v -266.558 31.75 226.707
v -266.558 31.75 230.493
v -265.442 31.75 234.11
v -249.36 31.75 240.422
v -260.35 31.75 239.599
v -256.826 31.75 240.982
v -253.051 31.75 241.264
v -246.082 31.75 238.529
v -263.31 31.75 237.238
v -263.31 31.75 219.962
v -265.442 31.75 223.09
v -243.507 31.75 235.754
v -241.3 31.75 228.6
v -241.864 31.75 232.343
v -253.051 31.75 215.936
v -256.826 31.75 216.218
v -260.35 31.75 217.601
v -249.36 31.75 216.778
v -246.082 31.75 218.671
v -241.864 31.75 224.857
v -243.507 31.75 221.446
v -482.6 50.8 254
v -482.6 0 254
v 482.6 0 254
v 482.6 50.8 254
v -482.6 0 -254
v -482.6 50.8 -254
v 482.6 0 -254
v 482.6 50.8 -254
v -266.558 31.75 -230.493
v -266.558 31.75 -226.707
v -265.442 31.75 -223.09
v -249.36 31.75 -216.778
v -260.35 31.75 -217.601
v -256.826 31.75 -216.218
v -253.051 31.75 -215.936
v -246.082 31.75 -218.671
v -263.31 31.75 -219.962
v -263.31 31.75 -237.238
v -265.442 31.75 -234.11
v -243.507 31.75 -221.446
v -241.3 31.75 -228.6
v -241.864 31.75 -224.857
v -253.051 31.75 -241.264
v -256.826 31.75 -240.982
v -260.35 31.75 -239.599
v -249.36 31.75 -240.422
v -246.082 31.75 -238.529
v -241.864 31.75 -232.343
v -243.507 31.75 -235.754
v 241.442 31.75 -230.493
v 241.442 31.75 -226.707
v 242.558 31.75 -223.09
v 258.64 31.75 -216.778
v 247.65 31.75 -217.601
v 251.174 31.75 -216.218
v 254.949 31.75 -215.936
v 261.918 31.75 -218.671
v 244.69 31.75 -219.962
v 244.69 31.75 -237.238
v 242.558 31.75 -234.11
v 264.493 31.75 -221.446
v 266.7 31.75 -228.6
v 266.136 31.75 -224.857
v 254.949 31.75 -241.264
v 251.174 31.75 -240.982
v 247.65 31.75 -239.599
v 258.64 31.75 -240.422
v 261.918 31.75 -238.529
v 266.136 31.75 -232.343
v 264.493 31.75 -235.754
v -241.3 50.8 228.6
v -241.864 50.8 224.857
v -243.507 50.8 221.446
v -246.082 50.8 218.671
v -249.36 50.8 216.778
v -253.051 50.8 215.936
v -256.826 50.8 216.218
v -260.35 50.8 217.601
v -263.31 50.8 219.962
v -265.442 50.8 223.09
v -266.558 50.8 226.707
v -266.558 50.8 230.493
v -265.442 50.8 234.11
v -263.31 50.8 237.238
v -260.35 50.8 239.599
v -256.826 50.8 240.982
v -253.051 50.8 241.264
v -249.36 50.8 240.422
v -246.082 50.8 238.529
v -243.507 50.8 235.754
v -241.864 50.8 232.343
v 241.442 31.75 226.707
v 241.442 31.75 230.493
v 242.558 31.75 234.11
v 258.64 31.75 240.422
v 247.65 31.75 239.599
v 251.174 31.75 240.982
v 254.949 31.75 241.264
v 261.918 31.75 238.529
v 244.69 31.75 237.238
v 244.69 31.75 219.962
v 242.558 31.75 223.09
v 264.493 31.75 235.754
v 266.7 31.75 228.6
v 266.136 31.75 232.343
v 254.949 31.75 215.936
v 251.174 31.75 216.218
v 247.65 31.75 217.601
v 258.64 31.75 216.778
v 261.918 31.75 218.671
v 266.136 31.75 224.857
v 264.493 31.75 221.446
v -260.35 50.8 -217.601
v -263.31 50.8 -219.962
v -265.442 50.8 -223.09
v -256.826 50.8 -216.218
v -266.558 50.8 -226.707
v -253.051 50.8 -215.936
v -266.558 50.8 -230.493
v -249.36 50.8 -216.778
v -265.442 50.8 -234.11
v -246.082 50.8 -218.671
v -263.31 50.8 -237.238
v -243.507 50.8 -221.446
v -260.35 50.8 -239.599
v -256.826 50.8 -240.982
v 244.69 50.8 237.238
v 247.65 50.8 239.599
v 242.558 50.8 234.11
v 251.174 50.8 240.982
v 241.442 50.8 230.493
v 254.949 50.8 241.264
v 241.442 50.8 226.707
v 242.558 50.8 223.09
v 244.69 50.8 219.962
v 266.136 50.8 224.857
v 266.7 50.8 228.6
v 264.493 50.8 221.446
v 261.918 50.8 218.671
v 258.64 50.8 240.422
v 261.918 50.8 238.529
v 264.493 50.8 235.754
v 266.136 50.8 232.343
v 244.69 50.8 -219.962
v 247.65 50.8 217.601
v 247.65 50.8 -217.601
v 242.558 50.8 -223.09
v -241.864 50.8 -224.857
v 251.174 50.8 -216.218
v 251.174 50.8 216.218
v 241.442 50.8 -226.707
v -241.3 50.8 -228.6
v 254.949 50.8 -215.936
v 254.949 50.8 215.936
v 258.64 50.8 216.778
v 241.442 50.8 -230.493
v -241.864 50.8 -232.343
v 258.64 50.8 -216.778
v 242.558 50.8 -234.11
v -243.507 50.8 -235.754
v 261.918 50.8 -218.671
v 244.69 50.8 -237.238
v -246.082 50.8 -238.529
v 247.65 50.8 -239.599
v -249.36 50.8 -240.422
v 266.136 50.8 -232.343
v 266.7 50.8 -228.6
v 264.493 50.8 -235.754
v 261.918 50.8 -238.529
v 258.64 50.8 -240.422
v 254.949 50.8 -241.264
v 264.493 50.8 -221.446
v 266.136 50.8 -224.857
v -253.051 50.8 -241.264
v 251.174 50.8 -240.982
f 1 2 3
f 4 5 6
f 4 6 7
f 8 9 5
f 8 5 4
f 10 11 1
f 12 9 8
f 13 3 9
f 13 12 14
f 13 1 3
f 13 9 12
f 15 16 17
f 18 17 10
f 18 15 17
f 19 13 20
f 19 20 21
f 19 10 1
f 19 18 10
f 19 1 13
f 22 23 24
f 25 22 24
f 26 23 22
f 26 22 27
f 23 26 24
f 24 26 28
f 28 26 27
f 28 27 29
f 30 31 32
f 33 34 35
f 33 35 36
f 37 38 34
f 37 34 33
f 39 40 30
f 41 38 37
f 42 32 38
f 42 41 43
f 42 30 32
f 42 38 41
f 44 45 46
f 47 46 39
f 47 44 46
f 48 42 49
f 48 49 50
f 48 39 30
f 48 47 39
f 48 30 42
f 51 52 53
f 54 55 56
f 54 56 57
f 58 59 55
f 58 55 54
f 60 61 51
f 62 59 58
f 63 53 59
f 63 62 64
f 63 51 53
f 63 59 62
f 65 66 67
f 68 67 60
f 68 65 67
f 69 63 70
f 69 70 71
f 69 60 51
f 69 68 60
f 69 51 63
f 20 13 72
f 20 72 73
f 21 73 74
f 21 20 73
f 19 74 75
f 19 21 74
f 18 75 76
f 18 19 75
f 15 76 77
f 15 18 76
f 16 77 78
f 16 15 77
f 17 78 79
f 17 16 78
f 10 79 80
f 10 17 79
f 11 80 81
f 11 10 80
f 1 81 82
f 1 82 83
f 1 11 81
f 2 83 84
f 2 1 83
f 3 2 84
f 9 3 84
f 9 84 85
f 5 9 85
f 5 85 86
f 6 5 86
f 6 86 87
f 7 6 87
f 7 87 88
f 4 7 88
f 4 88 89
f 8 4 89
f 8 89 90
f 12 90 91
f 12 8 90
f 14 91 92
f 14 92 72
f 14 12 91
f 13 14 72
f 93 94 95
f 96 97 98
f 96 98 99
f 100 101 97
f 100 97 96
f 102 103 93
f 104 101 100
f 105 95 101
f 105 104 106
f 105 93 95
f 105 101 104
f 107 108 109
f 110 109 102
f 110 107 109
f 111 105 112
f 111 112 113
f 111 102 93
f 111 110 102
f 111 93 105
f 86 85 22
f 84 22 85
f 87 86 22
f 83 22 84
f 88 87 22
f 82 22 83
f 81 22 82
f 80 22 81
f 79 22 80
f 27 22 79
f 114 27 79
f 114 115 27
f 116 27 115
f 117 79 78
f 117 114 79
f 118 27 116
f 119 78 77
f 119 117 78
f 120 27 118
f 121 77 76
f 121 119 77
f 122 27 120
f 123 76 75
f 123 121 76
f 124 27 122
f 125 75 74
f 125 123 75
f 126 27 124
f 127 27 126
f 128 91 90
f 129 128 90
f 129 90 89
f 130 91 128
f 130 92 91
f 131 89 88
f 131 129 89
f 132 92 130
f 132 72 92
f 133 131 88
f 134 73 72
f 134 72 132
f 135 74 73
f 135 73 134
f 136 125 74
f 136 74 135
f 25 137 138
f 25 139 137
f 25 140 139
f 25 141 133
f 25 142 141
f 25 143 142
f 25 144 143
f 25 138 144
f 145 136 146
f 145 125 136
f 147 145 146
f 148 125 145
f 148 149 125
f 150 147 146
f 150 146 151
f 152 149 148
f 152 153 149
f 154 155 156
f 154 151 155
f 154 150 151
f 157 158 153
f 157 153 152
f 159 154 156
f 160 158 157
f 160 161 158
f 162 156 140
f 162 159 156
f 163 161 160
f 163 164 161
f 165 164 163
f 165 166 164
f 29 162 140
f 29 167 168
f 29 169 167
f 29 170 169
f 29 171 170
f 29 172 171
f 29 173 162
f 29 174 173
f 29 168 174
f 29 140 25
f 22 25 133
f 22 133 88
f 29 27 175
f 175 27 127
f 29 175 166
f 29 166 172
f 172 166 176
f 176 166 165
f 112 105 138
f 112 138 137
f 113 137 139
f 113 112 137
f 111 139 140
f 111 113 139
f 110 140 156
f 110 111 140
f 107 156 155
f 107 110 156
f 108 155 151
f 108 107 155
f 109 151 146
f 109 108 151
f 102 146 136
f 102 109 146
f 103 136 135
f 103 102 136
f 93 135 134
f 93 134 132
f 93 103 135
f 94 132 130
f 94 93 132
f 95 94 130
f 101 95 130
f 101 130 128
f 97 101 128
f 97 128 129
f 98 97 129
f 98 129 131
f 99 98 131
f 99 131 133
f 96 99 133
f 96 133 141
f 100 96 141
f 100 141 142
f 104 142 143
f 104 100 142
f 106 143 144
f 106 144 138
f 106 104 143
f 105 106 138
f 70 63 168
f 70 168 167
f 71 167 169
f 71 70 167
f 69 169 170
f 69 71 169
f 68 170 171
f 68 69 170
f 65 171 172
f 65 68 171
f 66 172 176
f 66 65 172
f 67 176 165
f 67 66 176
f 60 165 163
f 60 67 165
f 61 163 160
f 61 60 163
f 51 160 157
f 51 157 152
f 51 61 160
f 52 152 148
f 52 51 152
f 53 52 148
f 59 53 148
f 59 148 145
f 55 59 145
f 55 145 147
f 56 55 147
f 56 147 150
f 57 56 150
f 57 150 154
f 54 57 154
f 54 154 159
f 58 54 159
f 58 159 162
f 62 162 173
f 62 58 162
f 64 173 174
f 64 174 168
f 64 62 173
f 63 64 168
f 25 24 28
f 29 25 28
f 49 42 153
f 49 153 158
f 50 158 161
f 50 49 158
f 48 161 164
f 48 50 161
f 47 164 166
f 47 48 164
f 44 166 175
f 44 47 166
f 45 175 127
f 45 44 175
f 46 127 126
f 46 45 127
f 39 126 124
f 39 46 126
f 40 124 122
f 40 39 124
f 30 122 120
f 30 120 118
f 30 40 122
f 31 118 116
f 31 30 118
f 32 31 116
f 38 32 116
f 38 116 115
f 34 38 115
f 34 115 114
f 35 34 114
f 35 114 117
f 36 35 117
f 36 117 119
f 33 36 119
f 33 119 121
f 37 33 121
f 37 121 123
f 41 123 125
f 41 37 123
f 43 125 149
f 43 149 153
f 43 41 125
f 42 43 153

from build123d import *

# Parameters (mm, degrees)
SKETCH1_W              = 965.2
SKETCH1_H              = 508
BOSS_EXTRUDE1_DEPTH    = 50.8
CUT_EXTRUDE3_START     = 31.75
CUT_EXTRUDE3_OUTLINE_R = 12.7
CUT_EXTRUDE3_DEPTH     = 19.05


# Read off the part's stored shape, not the designer's step: Cut-Extrude3
with BuildPart() as part:
    # Sketch1 → Boss-Extrude1 (new body)
    with BuildSketch(Plane(origin=(0, 0, 0), x_dir=(1, 0, 0), z_dir=(0, 1, 0))):
        Rectangle(SKETCH1_W, SKETCH1_H)
    extrude(amount=BOSS_EXTRUDE1_DEPTH)

    # Cut-Extrude3 outline → Cut-Extrude3 (cut)
    with BuildSketch(Plane(origin=(0, 0, 0), x_dir=(1, 0, 0), z_dir=(0, 1, 0)).offset(CUT_EXTRUDE3_START)):
        with Locations((-254, 228.6)):
            Circle(CUT_EXTRUDE3_OUTLINE_R)
        with Locations((-254, -228.6)):
            Circle(CUT_EXTRUDE3_OUTLINE_R)
        with Locations((254, -228.6)):
            Circle(CUT_EXTRUDE3_OUTLINE_R)
        with Locations((254, 228.6)):
            Circle(CUT_EXTRUDE3_OUTLINE_R)
    extrude(amount=CUT_EXTRUDE3_DEPTH, mode=Mode.SUBTRACT)


solid = part.part
